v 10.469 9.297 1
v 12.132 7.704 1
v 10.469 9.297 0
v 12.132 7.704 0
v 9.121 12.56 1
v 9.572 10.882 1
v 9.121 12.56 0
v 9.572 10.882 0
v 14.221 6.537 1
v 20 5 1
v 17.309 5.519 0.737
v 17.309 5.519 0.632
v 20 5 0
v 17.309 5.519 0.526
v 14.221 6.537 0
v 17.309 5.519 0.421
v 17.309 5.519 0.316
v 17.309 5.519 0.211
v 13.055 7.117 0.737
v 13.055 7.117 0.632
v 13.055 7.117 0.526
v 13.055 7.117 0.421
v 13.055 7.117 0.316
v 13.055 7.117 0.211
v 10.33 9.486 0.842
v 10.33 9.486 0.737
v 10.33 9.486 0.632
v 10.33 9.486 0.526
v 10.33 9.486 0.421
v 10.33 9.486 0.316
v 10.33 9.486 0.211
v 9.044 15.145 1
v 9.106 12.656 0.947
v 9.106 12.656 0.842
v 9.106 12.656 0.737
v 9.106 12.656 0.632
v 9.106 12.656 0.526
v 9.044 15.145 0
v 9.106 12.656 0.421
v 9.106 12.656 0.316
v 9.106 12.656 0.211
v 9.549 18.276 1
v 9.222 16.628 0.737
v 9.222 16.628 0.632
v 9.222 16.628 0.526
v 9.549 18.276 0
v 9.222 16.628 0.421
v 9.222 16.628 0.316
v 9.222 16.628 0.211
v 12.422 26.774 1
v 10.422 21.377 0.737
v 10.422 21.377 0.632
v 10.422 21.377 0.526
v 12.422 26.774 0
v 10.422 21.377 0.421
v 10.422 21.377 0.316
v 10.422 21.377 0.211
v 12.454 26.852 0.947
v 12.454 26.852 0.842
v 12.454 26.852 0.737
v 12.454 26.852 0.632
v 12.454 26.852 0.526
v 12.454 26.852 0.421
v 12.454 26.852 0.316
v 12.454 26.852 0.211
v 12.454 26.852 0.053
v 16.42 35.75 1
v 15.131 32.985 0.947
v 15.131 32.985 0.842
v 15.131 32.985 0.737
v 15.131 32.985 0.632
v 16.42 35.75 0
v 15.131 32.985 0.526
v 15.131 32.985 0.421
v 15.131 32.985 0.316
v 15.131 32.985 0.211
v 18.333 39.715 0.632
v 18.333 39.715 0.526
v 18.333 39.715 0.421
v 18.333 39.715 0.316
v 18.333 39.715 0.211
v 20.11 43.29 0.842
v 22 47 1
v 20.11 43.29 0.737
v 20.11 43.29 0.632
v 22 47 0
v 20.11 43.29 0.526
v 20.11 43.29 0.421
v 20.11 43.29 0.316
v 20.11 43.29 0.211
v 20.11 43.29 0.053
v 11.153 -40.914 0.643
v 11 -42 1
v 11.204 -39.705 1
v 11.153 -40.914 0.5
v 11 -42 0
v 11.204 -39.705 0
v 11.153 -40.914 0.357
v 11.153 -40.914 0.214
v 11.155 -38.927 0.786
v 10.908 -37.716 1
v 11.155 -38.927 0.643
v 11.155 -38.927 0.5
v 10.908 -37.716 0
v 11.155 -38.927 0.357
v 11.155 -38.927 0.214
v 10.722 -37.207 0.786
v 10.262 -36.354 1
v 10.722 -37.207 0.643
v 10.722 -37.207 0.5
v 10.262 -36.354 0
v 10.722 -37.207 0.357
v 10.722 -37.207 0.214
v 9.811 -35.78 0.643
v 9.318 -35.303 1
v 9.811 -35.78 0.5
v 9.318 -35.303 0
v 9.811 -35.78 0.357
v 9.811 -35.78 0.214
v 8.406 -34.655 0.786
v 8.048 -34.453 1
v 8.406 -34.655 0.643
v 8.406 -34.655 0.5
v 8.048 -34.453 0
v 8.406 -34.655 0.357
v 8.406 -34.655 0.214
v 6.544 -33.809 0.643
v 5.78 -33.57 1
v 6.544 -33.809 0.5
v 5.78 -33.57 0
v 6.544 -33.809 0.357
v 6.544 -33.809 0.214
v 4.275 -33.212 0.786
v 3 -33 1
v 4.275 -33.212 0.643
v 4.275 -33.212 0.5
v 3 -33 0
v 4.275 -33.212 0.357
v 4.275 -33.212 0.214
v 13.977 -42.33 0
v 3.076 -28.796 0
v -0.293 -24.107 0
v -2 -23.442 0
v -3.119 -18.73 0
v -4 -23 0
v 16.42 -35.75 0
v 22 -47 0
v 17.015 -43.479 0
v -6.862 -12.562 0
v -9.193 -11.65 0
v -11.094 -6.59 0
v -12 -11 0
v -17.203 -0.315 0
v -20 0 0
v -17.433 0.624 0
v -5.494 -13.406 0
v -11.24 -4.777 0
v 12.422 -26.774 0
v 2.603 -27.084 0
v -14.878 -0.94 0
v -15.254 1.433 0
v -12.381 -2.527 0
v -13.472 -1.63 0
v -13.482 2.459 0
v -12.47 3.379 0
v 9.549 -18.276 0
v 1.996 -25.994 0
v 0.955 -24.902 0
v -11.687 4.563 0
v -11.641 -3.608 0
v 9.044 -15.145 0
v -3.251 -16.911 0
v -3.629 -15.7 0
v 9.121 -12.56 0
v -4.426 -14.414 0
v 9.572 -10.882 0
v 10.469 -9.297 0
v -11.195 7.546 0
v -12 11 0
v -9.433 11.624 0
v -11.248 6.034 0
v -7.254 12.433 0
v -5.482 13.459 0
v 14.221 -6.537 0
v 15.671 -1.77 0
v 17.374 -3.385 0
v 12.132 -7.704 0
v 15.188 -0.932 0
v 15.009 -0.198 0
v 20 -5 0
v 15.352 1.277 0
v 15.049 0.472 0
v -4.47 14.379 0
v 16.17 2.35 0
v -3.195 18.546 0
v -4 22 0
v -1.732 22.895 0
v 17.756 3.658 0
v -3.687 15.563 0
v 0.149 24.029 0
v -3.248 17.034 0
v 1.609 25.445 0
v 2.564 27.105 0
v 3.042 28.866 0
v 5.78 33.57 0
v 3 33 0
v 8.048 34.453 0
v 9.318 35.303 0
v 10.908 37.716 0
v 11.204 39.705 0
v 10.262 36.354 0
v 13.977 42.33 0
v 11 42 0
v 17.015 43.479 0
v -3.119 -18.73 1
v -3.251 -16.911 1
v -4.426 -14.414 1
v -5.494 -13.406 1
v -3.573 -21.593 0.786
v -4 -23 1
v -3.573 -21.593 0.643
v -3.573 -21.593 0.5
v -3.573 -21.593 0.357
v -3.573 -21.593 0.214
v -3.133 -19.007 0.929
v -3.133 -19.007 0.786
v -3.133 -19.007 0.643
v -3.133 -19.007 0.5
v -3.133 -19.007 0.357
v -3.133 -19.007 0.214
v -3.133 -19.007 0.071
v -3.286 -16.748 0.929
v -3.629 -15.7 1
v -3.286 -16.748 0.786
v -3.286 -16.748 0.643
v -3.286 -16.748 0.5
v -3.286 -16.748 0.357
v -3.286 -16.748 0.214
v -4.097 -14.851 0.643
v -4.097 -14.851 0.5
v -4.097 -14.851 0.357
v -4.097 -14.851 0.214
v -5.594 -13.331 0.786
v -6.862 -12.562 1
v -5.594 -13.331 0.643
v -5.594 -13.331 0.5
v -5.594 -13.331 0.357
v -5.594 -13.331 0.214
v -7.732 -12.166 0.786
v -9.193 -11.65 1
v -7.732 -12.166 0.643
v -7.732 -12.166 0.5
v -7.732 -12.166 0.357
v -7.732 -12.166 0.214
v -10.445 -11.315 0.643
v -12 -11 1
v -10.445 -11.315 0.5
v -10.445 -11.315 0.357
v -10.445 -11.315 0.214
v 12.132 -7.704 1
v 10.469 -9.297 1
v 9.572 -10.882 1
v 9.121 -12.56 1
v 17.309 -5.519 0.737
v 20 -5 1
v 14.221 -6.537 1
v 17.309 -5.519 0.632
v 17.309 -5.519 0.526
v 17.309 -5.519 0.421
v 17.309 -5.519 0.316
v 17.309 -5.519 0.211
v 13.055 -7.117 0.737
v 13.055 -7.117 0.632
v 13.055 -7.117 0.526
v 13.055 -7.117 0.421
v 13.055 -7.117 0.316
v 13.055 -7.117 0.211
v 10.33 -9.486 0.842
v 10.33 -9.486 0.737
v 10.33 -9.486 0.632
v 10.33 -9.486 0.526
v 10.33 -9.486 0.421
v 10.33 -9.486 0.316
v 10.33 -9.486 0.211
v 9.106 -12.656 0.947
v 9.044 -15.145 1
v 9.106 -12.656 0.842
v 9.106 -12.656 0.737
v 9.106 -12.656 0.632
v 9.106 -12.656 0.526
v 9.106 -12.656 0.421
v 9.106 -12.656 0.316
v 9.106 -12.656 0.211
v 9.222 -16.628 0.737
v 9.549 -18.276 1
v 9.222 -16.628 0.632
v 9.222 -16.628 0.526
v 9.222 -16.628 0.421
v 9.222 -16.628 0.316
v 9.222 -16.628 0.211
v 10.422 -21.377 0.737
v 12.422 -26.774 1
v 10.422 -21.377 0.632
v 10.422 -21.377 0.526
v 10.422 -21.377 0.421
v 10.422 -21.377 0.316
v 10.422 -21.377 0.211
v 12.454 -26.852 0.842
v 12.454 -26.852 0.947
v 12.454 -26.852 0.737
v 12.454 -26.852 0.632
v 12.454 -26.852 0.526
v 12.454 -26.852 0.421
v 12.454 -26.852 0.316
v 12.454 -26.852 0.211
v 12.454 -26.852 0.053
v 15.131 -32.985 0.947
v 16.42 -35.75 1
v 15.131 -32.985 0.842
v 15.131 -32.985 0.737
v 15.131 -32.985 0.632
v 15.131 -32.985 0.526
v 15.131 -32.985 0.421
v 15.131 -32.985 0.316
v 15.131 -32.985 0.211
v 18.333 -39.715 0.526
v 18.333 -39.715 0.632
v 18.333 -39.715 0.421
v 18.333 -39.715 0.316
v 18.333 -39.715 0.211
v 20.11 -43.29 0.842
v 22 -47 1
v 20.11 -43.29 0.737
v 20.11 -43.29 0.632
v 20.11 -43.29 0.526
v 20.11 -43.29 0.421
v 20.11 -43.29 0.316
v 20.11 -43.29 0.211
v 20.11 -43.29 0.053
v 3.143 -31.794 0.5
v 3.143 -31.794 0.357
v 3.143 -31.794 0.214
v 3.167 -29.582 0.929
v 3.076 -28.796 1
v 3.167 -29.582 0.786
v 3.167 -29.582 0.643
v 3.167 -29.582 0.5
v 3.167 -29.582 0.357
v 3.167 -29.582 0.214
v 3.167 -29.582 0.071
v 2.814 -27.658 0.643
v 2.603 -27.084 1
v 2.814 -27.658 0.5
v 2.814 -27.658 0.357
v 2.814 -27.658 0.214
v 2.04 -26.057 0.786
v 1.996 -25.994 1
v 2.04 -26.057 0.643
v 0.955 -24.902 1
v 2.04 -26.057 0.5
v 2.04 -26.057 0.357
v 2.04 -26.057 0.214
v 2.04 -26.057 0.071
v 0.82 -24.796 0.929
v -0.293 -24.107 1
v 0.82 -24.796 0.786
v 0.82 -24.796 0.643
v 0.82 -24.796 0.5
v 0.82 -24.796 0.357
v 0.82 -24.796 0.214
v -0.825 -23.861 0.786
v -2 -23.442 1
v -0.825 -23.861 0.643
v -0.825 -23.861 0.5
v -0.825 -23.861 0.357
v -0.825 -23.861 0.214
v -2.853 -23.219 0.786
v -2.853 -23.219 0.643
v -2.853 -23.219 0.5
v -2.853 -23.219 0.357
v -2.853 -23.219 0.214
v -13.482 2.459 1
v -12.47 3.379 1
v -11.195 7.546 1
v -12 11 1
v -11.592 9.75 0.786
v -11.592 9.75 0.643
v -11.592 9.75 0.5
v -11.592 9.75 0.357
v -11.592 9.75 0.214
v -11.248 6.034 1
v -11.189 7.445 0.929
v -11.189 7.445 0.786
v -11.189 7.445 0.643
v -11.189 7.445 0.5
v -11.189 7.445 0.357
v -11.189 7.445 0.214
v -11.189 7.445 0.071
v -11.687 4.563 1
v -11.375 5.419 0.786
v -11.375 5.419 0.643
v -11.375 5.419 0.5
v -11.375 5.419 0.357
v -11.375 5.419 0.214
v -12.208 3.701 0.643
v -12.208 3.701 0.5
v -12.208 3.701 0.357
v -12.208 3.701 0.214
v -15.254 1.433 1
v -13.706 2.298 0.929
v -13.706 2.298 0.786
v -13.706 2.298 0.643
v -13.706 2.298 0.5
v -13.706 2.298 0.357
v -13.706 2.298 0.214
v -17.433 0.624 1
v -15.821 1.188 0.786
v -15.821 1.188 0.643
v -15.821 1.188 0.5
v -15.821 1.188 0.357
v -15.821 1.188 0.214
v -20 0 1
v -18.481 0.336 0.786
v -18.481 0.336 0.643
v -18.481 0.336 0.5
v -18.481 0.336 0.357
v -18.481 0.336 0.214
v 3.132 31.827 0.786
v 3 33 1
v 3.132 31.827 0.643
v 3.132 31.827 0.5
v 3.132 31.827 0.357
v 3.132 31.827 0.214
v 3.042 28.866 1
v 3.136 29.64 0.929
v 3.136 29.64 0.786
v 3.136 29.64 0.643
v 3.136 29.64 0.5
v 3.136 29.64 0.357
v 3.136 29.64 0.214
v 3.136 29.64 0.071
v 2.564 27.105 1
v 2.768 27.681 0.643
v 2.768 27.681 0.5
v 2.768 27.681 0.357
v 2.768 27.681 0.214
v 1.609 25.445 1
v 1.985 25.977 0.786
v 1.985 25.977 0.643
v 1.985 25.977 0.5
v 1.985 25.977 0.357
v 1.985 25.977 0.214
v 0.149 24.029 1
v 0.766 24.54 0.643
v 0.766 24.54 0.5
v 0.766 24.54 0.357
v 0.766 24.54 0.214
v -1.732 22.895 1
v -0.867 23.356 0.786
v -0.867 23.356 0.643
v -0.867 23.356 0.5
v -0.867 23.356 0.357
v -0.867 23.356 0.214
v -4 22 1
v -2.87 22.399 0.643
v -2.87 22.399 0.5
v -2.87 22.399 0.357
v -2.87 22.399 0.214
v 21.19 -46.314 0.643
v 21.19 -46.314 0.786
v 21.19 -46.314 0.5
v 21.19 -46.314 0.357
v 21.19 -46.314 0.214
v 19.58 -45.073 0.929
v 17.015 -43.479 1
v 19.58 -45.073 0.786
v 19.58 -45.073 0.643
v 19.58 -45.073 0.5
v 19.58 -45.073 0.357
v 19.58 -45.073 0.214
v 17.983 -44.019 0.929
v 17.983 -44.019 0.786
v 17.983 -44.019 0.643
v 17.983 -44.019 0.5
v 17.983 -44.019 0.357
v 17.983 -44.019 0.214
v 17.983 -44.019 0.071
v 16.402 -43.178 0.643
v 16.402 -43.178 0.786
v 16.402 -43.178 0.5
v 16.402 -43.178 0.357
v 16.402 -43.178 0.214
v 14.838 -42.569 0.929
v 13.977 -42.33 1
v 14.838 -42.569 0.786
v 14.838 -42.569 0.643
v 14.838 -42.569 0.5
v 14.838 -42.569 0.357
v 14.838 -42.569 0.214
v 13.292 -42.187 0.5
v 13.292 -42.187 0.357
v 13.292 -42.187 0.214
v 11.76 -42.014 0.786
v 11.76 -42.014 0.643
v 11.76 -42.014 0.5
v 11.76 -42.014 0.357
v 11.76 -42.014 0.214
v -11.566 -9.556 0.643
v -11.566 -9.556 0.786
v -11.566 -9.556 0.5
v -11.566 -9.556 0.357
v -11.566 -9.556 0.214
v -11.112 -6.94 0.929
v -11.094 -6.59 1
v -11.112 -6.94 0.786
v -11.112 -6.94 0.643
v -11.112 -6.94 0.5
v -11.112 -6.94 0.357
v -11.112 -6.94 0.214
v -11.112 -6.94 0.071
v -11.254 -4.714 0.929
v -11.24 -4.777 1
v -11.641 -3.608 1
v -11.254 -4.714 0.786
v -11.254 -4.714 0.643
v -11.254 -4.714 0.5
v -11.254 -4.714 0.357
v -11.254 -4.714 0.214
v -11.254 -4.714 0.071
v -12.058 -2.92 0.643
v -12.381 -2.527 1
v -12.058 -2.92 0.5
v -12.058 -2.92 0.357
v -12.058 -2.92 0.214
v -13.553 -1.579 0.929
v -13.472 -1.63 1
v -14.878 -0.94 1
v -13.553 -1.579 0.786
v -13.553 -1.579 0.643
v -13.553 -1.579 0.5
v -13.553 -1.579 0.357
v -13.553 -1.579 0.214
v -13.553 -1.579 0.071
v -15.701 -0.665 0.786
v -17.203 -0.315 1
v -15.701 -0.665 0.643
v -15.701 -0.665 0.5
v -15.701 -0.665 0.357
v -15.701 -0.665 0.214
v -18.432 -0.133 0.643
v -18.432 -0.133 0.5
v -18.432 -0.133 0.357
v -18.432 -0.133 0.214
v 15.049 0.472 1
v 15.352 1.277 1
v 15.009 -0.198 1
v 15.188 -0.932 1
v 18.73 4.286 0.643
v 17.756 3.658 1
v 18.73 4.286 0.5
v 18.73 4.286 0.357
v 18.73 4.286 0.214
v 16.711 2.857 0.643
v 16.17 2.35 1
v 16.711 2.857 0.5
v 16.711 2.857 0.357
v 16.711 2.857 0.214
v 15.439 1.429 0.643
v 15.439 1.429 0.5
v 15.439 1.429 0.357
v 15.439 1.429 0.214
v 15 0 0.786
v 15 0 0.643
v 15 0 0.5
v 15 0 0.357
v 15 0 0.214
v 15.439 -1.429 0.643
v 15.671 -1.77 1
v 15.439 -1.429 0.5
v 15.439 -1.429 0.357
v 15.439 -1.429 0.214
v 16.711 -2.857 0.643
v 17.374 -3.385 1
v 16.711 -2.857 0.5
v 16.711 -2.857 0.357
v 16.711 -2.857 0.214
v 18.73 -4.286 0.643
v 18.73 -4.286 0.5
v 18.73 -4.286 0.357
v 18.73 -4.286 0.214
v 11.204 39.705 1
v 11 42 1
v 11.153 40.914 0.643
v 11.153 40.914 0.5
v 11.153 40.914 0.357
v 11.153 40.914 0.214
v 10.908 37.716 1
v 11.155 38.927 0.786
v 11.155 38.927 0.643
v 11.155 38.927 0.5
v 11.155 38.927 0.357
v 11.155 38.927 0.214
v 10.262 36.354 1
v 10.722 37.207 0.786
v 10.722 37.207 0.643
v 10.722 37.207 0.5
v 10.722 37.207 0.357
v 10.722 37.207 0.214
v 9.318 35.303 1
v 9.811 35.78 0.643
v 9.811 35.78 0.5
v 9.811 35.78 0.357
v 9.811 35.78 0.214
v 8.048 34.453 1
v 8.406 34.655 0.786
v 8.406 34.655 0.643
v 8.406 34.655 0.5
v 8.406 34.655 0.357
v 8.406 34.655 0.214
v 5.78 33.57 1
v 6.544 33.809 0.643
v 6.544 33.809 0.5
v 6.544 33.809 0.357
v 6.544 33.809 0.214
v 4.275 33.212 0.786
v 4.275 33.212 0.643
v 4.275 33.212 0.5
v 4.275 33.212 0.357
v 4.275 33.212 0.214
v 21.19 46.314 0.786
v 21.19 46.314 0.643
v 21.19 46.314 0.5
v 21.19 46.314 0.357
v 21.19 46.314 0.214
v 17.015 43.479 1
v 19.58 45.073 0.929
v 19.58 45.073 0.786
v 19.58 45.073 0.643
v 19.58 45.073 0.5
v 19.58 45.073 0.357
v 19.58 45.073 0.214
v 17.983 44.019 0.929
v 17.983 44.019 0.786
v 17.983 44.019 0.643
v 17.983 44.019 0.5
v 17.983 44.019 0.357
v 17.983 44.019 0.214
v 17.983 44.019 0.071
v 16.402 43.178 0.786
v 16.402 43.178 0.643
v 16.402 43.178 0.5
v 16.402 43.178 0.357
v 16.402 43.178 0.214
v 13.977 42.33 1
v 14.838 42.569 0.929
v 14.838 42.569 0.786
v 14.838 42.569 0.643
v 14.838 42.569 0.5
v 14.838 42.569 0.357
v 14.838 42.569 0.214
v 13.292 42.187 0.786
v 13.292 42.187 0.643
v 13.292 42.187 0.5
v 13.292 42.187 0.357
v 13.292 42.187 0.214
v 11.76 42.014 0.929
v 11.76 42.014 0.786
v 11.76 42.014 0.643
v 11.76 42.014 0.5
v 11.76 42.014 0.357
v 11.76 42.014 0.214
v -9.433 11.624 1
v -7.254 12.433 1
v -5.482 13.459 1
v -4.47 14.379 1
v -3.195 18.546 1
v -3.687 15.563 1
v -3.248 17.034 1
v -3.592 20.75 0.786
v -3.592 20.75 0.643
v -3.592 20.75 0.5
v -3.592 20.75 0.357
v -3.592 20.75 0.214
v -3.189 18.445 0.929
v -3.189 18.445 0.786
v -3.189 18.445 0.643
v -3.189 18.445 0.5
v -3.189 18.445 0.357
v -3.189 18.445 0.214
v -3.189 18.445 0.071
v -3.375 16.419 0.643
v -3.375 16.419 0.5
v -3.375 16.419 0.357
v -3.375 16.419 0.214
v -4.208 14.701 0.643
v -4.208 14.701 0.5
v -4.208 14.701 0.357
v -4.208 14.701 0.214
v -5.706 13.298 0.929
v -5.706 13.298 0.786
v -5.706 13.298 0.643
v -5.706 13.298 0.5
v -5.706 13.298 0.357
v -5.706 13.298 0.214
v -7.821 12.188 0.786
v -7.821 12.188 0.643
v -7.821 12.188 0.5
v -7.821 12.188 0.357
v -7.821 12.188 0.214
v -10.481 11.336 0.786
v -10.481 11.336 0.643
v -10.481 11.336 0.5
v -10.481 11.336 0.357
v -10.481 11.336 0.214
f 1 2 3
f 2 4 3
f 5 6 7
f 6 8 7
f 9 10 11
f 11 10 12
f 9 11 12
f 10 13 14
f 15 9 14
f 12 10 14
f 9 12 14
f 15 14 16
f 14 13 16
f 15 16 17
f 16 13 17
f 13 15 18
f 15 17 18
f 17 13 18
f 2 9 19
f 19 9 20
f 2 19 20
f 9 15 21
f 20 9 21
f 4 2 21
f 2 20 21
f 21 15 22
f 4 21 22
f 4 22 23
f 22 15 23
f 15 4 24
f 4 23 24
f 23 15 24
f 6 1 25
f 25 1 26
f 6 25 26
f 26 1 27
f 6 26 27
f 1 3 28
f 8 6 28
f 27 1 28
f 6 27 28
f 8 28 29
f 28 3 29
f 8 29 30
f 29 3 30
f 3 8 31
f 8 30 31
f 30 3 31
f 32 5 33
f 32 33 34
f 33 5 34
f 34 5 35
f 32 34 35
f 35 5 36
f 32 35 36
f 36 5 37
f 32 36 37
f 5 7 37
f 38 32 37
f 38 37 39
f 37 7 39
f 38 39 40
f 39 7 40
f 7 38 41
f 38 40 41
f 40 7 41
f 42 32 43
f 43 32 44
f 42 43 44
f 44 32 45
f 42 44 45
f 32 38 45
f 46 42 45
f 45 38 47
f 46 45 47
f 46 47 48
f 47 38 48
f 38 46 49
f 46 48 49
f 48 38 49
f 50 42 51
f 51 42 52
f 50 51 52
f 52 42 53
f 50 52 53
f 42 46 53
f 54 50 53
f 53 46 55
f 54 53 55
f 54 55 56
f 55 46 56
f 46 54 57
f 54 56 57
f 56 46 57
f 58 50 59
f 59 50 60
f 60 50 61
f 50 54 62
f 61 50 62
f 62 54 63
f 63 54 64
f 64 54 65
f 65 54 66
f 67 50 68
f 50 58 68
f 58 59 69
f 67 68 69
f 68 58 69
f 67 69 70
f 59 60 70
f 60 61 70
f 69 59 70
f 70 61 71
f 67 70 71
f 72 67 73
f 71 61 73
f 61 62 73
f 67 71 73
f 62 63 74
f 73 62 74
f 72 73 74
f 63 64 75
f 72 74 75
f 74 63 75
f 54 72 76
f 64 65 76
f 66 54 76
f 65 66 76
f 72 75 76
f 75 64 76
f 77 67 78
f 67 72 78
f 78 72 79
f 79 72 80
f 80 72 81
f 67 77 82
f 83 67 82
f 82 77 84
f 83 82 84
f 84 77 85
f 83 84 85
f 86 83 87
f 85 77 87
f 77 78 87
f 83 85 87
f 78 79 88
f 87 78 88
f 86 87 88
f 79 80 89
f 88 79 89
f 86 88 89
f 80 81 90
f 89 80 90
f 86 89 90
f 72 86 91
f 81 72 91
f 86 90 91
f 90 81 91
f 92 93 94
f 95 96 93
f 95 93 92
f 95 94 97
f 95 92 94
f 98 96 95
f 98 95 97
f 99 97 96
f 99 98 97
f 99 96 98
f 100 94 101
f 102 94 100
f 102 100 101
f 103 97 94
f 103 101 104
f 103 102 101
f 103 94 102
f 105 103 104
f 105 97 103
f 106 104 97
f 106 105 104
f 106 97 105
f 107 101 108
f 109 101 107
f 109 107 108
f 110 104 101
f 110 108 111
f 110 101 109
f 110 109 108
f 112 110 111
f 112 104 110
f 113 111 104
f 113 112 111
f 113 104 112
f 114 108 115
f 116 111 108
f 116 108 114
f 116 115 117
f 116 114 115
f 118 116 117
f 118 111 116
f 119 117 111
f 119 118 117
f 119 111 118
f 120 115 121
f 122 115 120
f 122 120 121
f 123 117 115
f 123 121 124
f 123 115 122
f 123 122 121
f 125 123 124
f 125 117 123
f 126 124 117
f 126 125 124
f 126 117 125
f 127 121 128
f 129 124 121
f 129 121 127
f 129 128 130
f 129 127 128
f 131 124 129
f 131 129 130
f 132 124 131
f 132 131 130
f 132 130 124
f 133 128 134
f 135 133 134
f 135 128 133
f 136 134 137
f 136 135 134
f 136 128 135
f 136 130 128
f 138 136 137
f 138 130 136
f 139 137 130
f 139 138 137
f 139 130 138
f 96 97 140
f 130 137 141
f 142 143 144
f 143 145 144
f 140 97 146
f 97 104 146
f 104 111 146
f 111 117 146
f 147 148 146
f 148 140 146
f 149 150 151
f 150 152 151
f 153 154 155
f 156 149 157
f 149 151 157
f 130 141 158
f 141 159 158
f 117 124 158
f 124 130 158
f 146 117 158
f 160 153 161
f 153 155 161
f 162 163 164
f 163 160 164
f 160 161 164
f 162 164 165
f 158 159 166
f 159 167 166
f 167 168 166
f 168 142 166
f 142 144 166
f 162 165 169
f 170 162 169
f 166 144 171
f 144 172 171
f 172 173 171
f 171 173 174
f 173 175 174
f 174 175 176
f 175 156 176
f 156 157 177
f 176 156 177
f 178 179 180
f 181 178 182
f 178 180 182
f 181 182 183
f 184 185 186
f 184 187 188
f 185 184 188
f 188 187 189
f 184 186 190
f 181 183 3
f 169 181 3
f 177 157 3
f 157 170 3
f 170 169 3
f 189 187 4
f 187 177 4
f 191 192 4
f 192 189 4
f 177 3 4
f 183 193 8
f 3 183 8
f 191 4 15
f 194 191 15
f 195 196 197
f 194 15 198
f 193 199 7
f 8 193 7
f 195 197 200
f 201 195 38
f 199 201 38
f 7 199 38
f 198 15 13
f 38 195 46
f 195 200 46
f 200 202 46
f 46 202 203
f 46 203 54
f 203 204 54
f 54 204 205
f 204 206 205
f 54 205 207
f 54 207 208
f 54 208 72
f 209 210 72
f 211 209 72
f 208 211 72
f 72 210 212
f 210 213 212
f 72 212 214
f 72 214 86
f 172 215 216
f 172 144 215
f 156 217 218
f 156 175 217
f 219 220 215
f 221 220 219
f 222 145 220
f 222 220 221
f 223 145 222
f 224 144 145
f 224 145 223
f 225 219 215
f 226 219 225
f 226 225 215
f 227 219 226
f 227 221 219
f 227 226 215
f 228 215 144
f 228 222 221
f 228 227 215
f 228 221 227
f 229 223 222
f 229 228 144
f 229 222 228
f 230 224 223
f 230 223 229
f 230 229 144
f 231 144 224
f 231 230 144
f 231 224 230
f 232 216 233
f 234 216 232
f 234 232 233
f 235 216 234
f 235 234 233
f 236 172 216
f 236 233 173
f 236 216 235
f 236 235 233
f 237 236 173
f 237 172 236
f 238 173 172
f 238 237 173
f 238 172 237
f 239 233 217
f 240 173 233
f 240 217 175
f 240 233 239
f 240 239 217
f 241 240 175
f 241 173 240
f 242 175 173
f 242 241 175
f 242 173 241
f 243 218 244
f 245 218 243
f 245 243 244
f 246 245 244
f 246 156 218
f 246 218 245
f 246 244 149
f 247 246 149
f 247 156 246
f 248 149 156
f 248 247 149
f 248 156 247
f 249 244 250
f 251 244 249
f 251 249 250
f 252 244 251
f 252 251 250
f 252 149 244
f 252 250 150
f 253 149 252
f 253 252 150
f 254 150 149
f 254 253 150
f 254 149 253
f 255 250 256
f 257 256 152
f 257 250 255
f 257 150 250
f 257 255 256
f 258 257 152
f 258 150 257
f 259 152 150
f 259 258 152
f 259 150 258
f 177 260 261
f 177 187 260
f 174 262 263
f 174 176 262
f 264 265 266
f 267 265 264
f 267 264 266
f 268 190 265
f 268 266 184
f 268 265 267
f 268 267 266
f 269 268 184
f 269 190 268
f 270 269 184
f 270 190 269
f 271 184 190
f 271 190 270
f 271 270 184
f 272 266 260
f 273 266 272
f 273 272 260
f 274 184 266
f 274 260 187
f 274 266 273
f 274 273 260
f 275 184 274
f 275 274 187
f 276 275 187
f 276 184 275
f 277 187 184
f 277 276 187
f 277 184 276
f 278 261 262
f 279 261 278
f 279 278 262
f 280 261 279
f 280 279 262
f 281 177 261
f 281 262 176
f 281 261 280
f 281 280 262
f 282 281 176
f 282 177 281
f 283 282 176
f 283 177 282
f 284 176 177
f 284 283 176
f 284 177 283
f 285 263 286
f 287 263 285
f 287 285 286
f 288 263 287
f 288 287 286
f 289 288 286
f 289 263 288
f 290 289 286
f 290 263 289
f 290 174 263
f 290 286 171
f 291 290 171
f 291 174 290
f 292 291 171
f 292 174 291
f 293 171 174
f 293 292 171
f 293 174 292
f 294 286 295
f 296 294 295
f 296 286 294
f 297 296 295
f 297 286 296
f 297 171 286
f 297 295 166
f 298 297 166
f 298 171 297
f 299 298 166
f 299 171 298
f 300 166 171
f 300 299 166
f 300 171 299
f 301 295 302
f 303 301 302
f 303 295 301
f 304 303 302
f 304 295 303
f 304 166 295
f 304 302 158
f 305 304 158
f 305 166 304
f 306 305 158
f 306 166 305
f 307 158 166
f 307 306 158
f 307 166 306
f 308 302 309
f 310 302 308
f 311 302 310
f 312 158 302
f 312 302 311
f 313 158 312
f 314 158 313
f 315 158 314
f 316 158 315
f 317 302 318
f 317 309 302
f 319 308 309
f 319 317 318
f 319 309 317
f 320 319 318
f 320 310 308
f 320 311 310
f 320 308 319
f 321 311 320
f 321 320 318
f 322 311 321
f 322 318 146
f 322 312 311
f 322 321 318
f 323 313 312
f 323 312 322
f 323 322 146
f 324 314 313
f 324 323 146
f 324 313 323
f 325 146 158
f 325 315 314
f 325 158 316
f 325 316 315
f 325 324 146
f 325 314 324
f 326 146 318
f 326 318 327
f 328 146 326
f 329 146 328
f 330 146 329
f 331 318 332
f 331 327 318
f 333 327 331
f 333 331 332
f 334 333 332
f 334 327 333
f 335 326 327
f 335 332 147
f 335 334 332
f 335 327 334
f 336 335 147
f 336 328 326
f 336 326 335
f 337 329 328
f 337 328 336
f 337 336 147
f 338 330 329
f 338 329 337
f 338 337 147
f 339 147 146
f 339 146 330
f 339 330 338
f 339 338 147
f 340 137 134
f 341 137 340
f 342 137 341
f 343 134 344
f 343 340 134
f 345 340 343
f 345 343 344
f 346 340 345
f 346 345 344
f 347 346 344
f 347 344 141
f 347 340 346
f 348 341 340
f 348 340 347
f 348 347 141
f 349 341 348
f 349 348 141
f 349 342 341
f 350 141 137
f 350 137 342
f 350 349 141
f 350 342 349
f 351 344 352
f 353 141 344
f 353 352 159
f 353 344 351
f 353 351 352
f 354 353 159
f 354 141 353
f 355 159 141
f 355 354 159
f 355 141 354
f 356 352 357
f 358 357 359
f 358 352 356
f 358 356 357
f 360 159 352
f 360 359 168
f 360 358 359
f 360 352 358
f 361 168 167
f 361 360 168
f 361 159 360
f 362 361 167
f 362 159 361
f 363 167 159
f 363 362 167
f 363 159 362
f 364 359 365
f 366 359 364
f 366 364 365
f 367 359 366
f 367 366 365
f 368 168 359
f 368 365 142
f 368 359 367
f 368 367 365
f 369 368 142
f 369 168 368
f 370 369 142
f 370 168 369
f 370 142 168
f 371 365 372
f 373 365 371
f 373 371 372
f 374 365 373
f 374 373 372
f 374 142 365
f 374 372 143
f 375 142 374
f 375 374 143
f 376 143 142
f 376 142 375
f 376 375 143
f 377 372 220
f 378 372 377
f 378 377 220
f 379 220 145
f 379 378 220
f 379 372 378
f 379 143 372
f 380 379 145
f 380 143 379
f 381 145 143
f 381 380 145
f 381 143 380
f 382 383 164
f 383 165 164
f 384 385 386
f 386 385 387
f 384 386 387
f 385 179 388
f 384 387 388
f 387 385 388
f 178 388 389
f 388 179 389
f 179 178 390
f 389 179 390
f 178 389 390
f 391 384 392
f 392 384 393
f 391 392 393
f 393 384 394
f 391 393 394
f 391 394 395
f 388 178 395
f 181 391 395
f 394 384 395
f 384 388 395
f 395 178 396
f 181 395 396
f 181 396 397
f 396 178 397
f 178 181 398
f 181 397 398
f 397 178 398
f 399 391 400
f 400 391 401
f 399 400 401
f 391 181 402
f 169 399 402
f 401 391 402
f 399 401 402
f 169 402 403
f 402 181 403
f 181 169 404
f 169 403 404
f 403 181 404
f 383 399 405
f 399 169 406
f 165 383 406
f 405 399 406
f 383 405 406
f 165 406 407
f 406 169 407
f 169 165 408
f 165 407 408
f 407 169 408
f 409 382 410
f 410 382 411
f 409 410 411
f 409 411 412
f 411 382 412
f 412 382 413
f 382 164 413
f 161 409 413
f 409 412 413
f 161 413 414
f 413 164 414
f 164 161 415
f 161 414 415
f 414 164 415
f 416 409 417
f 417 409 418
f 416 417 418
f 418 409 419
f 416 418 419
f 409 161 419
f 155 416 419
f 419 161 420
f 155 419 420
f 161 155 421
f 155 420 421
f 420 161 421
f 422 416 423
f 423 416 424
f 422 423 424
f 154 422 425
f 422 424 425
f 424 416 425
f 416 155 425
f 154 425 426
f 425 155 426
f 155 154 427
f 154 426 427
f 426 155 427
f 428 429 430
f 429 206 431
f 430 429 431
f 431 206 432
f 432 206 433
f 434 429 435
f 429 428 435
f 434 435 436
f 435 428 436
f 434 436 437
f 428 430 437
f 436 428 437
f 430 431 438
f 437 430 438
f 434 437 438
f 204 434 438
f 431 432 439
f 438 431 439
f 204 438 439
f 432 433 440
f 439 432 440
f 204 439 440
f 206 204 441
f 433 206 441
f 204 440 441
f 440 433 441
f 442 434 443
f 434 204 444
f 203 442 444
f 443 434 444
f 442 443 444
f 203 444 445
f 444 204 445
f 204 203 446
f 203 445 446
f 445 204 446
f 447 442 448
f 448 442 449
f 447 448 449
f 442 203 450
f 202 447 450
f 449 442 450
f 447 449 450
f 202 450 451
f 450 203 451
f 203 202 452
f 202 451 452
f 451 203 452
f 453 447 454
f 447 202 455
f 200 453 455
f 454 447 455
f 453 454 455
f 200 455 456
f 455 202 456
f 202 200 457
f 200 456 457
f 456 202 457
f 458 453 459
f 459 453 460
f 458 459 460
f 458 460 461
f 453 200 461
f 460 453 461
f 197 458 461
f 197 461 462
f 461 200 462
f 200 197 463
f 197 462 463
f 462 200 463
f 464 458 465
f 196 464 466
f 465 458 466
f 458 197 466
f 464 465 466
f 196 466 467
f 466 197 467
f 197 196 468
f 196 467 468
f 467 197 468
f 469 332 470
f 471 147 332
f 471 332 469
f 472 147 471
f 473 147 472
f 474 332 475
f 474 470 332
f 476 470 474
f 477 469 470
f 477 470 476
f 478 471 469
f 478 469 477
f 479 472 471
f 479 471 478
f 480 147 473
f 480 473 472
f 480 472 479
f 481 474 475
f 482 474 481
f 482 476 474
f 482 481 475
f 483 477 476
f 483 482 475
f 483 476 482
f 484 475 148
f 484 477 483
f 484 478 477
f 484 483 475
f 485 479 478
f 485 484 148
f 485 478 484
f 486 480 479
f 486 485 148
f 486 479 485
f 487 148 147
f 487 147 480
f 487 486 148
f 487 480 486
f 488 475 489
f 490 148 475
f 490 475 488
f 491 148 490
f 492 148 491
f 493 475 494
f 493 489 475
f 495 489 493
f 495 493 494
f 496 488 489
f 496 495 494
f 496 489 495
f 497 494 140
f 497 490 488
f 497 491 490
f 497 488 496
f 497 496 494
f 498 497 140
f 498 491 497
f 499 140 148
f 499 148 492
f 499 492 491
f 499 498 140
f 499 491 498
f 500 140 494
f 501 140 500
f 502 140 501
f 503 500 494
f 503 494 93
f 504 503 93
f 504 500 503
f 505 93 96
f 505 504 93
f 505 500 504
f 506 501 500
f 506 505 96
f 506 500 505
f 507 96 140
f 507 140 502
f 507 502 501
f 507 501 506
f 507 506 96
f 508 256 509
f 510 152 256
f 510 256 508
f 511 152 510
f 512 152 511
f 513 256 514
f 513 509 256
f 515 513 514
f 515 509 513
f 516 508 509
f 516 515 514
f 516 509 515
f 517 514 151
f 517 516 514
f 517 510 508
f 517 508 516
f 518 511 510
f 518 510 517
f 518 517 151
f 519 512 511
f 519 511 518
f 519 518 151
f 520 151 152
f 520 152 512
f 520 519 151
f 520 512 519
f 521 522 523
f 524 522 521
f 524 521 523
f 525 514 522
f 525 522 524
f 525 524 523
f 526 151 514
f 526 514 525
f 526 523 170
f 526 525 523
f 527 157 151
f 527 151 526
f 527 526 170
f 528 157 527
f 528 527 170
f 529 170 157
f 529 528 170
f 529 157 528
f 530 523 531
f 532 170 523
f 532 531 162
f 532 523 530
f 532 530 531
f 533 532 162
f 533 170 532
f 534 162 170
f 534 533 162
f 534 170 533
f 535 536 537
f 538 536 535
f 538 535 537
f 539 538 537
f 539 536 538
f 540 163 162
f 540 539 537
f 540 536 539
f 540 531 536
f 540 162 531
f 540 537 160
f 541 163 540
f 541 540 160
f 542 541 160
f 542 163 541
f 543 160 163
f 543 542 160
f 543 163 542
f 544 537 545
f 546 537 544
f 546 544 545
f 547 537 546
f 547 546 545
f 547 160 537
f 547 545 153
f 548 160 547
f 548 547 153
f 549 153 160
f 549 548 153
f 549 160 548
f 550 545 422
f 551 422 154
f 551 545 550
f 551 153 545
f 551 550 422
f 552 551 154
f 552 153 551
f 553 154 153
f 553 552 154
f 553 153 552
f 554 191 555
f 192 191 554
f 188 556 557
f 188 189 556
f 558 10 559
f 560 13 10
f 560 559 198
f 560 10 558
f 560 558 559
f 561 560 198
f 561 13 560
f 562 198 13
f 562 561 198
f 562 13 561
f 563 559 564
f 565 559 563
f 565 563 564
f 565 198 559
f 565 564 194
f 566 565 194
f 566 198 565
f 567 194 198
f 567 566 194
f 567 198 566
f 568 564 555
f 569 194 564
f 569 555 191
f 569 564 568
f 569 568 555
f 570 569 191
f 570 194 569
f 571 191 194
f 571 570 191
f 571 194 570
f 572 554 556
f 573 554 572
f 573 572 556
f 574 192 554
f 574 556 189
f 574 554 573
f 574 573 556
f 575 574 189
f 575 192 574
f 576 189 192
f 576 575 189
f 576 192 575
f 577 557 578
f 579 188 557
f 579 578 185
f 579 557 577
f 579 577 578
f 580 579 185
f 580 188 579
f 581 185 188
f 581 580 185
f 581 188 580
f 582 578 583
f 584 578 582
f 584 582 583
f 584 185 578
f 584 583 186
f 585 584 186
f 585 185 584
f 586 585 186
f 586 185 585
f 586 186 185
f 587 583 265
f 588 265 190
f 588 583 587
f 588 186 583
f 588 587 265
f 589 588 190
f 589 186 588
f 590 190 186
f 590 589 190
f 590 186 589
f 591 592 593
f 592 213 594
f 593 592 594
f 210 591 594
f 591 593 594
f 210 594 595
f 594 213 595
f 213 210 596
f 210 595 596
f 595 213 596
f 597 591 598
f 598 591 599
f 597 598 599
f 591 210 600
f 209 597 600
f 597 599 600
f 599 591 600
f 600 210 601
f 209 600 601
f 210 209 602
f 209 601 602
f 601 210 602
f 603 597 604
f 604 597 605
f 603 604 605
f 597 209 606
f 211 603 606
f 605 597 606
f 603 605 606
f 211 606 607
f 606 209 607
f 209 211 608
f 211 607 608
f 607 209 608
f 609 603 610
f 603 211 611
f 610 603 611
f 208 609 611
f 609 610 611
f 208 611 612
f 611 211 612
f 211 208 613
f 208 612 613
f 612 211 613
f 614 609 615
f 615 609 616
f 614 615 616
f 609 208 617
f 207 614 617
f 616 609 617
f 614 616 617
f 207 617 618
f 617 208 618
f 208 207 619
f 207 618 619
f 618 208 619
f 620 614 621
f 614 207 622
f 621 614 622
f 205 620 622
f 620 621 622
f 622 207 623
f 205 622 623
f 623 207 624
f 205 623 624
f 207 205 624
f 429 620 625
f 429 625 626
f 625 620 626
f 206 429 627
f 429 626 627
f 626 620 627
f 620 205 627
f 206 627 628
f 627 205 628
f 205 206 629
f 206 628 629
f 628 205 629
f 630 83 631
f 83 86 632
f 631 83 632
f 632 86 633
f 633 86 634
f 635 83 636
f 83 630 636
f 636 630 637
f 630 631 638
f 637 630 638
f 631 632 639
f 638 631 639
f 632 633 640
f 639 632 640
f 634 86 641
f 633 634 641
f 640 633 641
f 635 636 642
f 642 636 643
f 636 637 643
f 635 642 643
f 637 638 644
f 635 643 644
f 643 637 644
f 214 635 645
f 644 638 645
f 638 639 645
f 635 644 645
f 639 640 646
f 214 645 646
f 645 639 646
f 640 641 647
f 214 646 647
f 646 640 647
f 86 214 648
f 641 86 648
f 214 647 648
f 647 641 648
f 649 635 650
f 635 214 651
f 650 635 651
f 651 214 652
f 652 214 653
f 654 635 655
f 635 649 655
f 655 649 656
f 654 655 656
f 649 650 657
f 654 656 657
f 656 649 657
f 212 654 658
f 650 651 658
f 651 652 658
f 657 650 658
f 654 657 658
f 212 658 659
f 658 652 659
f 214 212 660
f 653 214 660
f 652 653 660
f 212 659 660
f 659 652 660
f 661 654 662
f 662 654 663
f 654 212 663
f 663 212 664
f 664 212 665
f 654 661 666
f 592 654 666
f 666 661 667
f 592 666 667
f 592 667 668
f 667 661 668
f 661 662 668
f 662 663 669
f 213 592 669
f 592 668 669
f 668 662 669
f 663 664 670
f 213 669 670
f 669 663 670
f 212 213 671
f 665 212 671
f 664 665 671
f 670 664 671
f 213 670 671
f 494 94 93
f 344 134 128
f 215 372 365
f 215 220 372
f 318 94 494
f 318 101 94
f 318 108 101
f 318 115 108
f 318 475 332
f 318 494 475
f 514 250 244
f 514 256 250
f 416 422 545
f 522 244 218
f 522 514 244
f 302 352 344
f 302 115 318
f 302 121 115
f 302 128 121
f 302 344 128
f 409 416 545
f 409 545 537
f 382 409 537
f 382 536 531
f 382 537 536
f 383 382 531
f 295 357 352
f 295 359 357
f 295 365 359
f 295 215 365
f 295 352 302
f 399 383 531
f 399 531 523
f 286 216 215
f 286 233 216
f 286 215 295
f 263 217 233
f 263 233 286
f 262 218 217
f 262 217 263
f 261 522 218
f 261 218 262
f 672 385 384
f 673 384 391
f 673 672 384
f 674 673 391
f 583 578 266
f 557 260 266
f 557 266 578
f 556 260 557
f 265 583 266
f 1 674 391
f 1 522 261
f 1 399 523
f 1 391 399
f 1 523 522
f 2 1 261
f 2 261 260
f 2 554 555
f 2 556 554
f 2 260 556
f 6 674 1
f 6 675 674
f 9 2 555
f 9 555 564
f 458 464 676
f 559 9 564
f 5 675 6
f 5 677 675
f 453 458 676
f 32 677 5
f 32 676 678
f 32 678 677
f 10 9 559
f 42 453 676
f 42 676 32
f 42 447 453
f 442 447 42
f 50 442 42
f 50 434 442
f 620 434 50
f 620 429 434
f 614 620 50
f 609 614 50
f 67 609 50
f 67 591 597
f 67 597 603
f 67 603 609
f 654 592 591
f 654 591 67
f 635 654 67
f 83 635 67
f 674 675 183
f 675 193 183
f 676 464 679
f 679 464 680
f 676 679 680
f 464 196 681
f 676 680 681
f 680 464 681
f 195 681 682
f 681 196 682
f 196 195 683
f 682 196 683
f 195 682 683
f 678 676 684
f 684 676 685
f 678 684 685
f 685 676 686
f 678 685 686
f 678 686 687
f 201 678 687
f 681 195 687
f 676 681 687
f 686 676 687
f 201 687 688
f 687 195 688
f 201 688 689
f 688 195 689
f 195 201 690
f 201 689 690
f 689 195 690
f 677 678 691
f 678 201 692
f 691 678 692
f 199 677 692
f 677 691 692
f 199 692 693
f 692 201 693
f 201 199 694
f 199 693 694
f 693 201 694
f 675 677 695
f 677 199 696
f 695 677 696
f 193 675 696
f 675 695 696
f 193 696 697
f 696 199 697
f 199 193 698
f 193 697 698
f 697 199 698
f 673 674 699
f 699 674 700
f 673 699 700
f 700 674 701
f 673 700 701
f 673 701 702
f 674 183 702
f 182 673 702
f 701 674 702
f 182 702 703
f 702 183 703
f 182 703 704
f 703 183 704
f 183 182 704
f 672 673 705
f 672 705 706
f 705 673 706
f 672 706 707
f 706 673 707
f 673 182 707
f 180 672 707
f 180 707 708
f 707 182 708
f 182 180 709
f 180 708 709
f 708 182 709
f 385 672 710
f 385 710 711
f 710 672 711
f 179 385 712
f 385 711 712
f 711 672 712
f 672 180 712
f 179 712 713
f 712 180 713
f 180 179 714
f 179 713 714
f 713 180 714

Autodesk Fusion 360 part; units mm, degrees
sketch "Sketch1" plane through (0, 0, 0) normal (0, 0, 1) x (1, 0, 0)
  spline S0 degree 5 poles (20, 5) (19.6208, 4.8) (18.8954, 4.4) (17.9067, 3.8) (16.7905, 3) (15.7547, 2) (15.1106, 1) (14.89, 0) (15.1106, -1) (15.7547, -2) (16.7905, -3) (17.9067, -3.8) (18.8954, -4.4) (19.6208, -4.8) (20, -5) knots 0 0 0 0 0 0 0.1 0.2 0.3 0.4 0.5 0.6 0.7 0.8 0.9 1 1 1 1 1 1
  spline S1 degree 5 poles (20, 5) (19.2712, 5.1081) (17.8733, 5.3538) (15.9554, 5.8111) (13.759, 6.5997) (11.6261, 7.8912) (10.1129, 9.4979) (9.2114, 11.428) (8.8832, 13.6833) (9.0671, 16.2602) (9.6928, 19.1509) (10.6903, 22.3442) (11.9999, 25.8244) (13.5744, 29.5733) (15.3779, 33.5733) (17.3852, 37.8091) (19.1413, 41.3771) (20.5394, 44.1509) (21.5072, 46.0431) (22, 47) knots 0 0 0 0 0 0 0.066667 0.133333 0.2 0.266667 0.333333 0.4 0.466667 0.533333 0.6 0.666667 0.733333 0.8 0.866667 0.933333 1 1 1 1 1 1
  spline S2 degree 5 poles (20, -5) (19.2712, -5.1081) (17.8733, -5.3538) (15.9554, -5.8111) (13.759, -6.5997) (11.6261, -7.8912) (10.1129, -9.4979) (9.2114, -11.428) (8.8832, -13.6833) (9.0671, -16.2602) (9.6928, -19.1509) (10.6903, -22.3442) (11.9999, -25.8244) (13.5744, -29.5733) (15.3779, -33.5733) (17.3852, -37.8091) (19.1413, -41.3771) (20.5394, -44.1509) (21.5072, -46.0431) (22, -47) knots 0 0 0 0 0 0 0.066667 0.133333 0.2 0.266667 0.333333 0.4 0.466667 0.533333 0.6 0.666667 0.733333 0.8 0.866667 0.933333 1 1 1 1 1 1
  spline S3 degree 5 poles (22, 47) (21.7727, 46.8021) (21.3189, 46.4146) (20.6399, 45.8581) (19.7383, 45.1666) (18.6179, 44.3921) (17.5049, 43.7166) (16.4, 43.1495) (15.3036, 42.6985) (14.2158, 42.3629) (13.136, 42.1358) (12.2781, 42.0345) (11.6378, 42.001) (11.2124, 41.9972) (11, 42) knots 0 0 0 0 0 0 0.1 0.2 0.3 0.4 0.5 0.6 0.7 0.8 0.9 1 1 1 1 1 1
  spline S4 degree 5 poles (22, -47) (21.7727, -46.8021) (21.3189, -46.4146) (20.6399, -45.8581) (19.7383, -45.1666) (18.6179, -44.3921) (17.5049, -43.7166) (16.4, -43.1495) (15.3036, -42.6985) (14.2158, -42.3629) (13.136, -42.1358) (12.2781, -42.0345) (11.6378, -42.001) (11.2124, -41.9972) (11, -42) knots 0 0 0 0 0 0 0.1 0.2 0.3 0.4 0.5 0.6 0.7 0.8 0.9 1 1 1 1 1 1
  spline S5 degree 5 poles (11, 42) (11.0567, 41.6874) (11.1508, 41.074) (11.2338, 40.1895) (11.2264, 39.0824) (11.0075, 37.8268) (10.5616, 36.7102) (9.8726, 35.7422) (8.9361, 34.9257) (7.7664, 34.252) (6.3831, 33.7089) (5.1205, 33.3698) (4.0916, 33.1657) (3.3698, 33.0516) (3, 33) knots 0 0 0 0 0 0 0.1 0.2 0.3 0.4 0.5 0.6 0.7 0.8 0.9 1 1 1 1 1 1
  spline S6 degree 5 poles (11, -42) (11.0567, -41.6874) (11.1508, -41.074) (11.2338, -40.1895) (11.2264, -39.0824) (11.0075, -37.8268) (10.5616, -36.7102) (9.8726, -35.7422) (8.9361, -34.9257) (7.7664, -34.252) (6.3831, -33.7089) (5.1205, -33.3698) (4.0916, -33.1657) (3.3698, -33.0516) (3, -33) knots 0 0 0 0 0 0 0.1 0.2 0.3 0.4 0.5 0.6 0.7 0.8 0.9 1 1 1 1 1 1
  spline S7 degree 5 poles (3, 33) (3.0488, 32.6643) (3.1298, 32.003) (3.2017, 31.0414) (3.1969, 29.8211) (3.0117, 28.4056) (2.6312, 27.1097) (2.0398, 25.9431) (1.2292, 24.9109) (0.2085, 24.0075) (-1.0064, 23.2232) (-2.1209, 22.683) (-3.0317, 22.3239) (-3.6718, 22.1046) (-4, 22) knots 0 0 0 0 0 0 0.1 0.2 0.3 0.4 0.5 0.6 0.7 0.8 0.9 1 1 1 1 1 1
  spline S8 degree 5 poles (3, -33) (3.0519, -32.6532) (3.1391, -31.9722) (3.2199, -30.9891) (3.2258, -29.756) (3.0522, -28.3533) (2.6811, -27.1017) (2.0958, -26.0139) (1.2865, -25.0975) (0.261, -24.3466) (-0.965, -23.749) (-2.0931, -23.3837) (-3.0168, -23.1691) (-3.6666, -23.052) (-4, -23) knots 0 0 0 0 0 0 0.1 0.2 0.3 0.4 0.5 0.6 0.7 0.8 0.9 1 1 1 1 1 1
  spline S9 degree 5 poles (-4, 22) (-3.8671, 21.6411) (-3.6275, 20.9356) (-3.3469, 19.9148) (-3.1327, 18.6296) (-3.149, 17.1578) (-3.4725, 15.8318) (-4.1248, 14.6617) (-5.1107, 13.6499) (-6.4105, 12.787) (-7.9976, 12.0604) (-9.4768, 11.5784) (-10.6963, 11.2692) (-11.5574, 11.0859) (-12, 11) knots 0 0 0 0 0 0 0.1 0.2 0.3 0.4 0.5 0.6 0.7 0.8 0.9 1 1 1 1 1 1
  spline S10 degree 5 poles (-4, -23) (-3.8615, -22.5957) (-3.6109, -21.8015) (-3.3142, -20.6538) (-3.0793, -19.2121) (-3.0716, -17.5674) (-3.3744, -16.0936) (-4.0114, -14.8039) (-4.9925, -13.7036) (-6.3007, -12.7834) (-7.91, -12.029) (-9.4177, -11.5468) (-10.6645, -11.249) (-11.5464, -11.0783) (-12, -11) knots 0 0 0 0 0 0 0.1 0.2 0.3 0.4 0.5 0.6 0.7 0.8 0.9 1 1 1 1 1 1
  spline S11 degree 5 poles (-12, 11) (-11.8671, 10.6411) (-11.6275, 9.9356) (-11.3469, 8.9148) (-11.1327, 7.6296) (-11.149, 6.1578) (-11.4725, 4.8318) (-12.1248, 3.6617) (-13.1107, 2.6499) (-14.4105, 1.787) (-15.9976, 1.0604) (-17.4768, 0.5784) (-18.6963, 0.2692) (-19.5574, 0.0859) (-20, 0) knots 0 0 0 0 0 0 0.1 0.2 0.3 0.4 0.5 0.6 0.7 0.8 0.9 1 1 1 1 1 1
  spline S12 degree 5 poles (-12, -11) (-11.8595, -10.5833) (-11.605, -9.7673) (-11.3024, -8.5952) (-11.0601, -7.1378) (-11.0439, -5.5036) (-11.3393, -4.0734) (-11.9708, -2.8631) (-12.9501, -1.8804) (-14.2612, -1.1149) (-15.8784, -0.5497) (-17.3964, -0.2443) (-18.653, -0.0926) (-19.5424, -0.0252) (-20, 0) knots 0 0 0 0 0 0 0.1 0.2 0.3 0.4 0.5 0.6 0.7 0.8 0.9 1 1 1 1 1 1
  point P0 (15, 0)
  point P1 (10, 10)
  point P2 (10, 20)
  point P3 (10, -10)
  point P4 (10, -20)
  point P5 (16, 43)
  point P6 (16, -43)
  point P7 (10, 36)
  point P8 (10, -36)
  point P9 (2, 26)
  point P10 (2, -26)
  point P11 (-4, 15)
  point P12 (-4, -15)
  point P13 (-12, 4)
  point P14 (-12, -3)
extrude "Extrude1" add sketch "Sketch1" along normal blind 1
